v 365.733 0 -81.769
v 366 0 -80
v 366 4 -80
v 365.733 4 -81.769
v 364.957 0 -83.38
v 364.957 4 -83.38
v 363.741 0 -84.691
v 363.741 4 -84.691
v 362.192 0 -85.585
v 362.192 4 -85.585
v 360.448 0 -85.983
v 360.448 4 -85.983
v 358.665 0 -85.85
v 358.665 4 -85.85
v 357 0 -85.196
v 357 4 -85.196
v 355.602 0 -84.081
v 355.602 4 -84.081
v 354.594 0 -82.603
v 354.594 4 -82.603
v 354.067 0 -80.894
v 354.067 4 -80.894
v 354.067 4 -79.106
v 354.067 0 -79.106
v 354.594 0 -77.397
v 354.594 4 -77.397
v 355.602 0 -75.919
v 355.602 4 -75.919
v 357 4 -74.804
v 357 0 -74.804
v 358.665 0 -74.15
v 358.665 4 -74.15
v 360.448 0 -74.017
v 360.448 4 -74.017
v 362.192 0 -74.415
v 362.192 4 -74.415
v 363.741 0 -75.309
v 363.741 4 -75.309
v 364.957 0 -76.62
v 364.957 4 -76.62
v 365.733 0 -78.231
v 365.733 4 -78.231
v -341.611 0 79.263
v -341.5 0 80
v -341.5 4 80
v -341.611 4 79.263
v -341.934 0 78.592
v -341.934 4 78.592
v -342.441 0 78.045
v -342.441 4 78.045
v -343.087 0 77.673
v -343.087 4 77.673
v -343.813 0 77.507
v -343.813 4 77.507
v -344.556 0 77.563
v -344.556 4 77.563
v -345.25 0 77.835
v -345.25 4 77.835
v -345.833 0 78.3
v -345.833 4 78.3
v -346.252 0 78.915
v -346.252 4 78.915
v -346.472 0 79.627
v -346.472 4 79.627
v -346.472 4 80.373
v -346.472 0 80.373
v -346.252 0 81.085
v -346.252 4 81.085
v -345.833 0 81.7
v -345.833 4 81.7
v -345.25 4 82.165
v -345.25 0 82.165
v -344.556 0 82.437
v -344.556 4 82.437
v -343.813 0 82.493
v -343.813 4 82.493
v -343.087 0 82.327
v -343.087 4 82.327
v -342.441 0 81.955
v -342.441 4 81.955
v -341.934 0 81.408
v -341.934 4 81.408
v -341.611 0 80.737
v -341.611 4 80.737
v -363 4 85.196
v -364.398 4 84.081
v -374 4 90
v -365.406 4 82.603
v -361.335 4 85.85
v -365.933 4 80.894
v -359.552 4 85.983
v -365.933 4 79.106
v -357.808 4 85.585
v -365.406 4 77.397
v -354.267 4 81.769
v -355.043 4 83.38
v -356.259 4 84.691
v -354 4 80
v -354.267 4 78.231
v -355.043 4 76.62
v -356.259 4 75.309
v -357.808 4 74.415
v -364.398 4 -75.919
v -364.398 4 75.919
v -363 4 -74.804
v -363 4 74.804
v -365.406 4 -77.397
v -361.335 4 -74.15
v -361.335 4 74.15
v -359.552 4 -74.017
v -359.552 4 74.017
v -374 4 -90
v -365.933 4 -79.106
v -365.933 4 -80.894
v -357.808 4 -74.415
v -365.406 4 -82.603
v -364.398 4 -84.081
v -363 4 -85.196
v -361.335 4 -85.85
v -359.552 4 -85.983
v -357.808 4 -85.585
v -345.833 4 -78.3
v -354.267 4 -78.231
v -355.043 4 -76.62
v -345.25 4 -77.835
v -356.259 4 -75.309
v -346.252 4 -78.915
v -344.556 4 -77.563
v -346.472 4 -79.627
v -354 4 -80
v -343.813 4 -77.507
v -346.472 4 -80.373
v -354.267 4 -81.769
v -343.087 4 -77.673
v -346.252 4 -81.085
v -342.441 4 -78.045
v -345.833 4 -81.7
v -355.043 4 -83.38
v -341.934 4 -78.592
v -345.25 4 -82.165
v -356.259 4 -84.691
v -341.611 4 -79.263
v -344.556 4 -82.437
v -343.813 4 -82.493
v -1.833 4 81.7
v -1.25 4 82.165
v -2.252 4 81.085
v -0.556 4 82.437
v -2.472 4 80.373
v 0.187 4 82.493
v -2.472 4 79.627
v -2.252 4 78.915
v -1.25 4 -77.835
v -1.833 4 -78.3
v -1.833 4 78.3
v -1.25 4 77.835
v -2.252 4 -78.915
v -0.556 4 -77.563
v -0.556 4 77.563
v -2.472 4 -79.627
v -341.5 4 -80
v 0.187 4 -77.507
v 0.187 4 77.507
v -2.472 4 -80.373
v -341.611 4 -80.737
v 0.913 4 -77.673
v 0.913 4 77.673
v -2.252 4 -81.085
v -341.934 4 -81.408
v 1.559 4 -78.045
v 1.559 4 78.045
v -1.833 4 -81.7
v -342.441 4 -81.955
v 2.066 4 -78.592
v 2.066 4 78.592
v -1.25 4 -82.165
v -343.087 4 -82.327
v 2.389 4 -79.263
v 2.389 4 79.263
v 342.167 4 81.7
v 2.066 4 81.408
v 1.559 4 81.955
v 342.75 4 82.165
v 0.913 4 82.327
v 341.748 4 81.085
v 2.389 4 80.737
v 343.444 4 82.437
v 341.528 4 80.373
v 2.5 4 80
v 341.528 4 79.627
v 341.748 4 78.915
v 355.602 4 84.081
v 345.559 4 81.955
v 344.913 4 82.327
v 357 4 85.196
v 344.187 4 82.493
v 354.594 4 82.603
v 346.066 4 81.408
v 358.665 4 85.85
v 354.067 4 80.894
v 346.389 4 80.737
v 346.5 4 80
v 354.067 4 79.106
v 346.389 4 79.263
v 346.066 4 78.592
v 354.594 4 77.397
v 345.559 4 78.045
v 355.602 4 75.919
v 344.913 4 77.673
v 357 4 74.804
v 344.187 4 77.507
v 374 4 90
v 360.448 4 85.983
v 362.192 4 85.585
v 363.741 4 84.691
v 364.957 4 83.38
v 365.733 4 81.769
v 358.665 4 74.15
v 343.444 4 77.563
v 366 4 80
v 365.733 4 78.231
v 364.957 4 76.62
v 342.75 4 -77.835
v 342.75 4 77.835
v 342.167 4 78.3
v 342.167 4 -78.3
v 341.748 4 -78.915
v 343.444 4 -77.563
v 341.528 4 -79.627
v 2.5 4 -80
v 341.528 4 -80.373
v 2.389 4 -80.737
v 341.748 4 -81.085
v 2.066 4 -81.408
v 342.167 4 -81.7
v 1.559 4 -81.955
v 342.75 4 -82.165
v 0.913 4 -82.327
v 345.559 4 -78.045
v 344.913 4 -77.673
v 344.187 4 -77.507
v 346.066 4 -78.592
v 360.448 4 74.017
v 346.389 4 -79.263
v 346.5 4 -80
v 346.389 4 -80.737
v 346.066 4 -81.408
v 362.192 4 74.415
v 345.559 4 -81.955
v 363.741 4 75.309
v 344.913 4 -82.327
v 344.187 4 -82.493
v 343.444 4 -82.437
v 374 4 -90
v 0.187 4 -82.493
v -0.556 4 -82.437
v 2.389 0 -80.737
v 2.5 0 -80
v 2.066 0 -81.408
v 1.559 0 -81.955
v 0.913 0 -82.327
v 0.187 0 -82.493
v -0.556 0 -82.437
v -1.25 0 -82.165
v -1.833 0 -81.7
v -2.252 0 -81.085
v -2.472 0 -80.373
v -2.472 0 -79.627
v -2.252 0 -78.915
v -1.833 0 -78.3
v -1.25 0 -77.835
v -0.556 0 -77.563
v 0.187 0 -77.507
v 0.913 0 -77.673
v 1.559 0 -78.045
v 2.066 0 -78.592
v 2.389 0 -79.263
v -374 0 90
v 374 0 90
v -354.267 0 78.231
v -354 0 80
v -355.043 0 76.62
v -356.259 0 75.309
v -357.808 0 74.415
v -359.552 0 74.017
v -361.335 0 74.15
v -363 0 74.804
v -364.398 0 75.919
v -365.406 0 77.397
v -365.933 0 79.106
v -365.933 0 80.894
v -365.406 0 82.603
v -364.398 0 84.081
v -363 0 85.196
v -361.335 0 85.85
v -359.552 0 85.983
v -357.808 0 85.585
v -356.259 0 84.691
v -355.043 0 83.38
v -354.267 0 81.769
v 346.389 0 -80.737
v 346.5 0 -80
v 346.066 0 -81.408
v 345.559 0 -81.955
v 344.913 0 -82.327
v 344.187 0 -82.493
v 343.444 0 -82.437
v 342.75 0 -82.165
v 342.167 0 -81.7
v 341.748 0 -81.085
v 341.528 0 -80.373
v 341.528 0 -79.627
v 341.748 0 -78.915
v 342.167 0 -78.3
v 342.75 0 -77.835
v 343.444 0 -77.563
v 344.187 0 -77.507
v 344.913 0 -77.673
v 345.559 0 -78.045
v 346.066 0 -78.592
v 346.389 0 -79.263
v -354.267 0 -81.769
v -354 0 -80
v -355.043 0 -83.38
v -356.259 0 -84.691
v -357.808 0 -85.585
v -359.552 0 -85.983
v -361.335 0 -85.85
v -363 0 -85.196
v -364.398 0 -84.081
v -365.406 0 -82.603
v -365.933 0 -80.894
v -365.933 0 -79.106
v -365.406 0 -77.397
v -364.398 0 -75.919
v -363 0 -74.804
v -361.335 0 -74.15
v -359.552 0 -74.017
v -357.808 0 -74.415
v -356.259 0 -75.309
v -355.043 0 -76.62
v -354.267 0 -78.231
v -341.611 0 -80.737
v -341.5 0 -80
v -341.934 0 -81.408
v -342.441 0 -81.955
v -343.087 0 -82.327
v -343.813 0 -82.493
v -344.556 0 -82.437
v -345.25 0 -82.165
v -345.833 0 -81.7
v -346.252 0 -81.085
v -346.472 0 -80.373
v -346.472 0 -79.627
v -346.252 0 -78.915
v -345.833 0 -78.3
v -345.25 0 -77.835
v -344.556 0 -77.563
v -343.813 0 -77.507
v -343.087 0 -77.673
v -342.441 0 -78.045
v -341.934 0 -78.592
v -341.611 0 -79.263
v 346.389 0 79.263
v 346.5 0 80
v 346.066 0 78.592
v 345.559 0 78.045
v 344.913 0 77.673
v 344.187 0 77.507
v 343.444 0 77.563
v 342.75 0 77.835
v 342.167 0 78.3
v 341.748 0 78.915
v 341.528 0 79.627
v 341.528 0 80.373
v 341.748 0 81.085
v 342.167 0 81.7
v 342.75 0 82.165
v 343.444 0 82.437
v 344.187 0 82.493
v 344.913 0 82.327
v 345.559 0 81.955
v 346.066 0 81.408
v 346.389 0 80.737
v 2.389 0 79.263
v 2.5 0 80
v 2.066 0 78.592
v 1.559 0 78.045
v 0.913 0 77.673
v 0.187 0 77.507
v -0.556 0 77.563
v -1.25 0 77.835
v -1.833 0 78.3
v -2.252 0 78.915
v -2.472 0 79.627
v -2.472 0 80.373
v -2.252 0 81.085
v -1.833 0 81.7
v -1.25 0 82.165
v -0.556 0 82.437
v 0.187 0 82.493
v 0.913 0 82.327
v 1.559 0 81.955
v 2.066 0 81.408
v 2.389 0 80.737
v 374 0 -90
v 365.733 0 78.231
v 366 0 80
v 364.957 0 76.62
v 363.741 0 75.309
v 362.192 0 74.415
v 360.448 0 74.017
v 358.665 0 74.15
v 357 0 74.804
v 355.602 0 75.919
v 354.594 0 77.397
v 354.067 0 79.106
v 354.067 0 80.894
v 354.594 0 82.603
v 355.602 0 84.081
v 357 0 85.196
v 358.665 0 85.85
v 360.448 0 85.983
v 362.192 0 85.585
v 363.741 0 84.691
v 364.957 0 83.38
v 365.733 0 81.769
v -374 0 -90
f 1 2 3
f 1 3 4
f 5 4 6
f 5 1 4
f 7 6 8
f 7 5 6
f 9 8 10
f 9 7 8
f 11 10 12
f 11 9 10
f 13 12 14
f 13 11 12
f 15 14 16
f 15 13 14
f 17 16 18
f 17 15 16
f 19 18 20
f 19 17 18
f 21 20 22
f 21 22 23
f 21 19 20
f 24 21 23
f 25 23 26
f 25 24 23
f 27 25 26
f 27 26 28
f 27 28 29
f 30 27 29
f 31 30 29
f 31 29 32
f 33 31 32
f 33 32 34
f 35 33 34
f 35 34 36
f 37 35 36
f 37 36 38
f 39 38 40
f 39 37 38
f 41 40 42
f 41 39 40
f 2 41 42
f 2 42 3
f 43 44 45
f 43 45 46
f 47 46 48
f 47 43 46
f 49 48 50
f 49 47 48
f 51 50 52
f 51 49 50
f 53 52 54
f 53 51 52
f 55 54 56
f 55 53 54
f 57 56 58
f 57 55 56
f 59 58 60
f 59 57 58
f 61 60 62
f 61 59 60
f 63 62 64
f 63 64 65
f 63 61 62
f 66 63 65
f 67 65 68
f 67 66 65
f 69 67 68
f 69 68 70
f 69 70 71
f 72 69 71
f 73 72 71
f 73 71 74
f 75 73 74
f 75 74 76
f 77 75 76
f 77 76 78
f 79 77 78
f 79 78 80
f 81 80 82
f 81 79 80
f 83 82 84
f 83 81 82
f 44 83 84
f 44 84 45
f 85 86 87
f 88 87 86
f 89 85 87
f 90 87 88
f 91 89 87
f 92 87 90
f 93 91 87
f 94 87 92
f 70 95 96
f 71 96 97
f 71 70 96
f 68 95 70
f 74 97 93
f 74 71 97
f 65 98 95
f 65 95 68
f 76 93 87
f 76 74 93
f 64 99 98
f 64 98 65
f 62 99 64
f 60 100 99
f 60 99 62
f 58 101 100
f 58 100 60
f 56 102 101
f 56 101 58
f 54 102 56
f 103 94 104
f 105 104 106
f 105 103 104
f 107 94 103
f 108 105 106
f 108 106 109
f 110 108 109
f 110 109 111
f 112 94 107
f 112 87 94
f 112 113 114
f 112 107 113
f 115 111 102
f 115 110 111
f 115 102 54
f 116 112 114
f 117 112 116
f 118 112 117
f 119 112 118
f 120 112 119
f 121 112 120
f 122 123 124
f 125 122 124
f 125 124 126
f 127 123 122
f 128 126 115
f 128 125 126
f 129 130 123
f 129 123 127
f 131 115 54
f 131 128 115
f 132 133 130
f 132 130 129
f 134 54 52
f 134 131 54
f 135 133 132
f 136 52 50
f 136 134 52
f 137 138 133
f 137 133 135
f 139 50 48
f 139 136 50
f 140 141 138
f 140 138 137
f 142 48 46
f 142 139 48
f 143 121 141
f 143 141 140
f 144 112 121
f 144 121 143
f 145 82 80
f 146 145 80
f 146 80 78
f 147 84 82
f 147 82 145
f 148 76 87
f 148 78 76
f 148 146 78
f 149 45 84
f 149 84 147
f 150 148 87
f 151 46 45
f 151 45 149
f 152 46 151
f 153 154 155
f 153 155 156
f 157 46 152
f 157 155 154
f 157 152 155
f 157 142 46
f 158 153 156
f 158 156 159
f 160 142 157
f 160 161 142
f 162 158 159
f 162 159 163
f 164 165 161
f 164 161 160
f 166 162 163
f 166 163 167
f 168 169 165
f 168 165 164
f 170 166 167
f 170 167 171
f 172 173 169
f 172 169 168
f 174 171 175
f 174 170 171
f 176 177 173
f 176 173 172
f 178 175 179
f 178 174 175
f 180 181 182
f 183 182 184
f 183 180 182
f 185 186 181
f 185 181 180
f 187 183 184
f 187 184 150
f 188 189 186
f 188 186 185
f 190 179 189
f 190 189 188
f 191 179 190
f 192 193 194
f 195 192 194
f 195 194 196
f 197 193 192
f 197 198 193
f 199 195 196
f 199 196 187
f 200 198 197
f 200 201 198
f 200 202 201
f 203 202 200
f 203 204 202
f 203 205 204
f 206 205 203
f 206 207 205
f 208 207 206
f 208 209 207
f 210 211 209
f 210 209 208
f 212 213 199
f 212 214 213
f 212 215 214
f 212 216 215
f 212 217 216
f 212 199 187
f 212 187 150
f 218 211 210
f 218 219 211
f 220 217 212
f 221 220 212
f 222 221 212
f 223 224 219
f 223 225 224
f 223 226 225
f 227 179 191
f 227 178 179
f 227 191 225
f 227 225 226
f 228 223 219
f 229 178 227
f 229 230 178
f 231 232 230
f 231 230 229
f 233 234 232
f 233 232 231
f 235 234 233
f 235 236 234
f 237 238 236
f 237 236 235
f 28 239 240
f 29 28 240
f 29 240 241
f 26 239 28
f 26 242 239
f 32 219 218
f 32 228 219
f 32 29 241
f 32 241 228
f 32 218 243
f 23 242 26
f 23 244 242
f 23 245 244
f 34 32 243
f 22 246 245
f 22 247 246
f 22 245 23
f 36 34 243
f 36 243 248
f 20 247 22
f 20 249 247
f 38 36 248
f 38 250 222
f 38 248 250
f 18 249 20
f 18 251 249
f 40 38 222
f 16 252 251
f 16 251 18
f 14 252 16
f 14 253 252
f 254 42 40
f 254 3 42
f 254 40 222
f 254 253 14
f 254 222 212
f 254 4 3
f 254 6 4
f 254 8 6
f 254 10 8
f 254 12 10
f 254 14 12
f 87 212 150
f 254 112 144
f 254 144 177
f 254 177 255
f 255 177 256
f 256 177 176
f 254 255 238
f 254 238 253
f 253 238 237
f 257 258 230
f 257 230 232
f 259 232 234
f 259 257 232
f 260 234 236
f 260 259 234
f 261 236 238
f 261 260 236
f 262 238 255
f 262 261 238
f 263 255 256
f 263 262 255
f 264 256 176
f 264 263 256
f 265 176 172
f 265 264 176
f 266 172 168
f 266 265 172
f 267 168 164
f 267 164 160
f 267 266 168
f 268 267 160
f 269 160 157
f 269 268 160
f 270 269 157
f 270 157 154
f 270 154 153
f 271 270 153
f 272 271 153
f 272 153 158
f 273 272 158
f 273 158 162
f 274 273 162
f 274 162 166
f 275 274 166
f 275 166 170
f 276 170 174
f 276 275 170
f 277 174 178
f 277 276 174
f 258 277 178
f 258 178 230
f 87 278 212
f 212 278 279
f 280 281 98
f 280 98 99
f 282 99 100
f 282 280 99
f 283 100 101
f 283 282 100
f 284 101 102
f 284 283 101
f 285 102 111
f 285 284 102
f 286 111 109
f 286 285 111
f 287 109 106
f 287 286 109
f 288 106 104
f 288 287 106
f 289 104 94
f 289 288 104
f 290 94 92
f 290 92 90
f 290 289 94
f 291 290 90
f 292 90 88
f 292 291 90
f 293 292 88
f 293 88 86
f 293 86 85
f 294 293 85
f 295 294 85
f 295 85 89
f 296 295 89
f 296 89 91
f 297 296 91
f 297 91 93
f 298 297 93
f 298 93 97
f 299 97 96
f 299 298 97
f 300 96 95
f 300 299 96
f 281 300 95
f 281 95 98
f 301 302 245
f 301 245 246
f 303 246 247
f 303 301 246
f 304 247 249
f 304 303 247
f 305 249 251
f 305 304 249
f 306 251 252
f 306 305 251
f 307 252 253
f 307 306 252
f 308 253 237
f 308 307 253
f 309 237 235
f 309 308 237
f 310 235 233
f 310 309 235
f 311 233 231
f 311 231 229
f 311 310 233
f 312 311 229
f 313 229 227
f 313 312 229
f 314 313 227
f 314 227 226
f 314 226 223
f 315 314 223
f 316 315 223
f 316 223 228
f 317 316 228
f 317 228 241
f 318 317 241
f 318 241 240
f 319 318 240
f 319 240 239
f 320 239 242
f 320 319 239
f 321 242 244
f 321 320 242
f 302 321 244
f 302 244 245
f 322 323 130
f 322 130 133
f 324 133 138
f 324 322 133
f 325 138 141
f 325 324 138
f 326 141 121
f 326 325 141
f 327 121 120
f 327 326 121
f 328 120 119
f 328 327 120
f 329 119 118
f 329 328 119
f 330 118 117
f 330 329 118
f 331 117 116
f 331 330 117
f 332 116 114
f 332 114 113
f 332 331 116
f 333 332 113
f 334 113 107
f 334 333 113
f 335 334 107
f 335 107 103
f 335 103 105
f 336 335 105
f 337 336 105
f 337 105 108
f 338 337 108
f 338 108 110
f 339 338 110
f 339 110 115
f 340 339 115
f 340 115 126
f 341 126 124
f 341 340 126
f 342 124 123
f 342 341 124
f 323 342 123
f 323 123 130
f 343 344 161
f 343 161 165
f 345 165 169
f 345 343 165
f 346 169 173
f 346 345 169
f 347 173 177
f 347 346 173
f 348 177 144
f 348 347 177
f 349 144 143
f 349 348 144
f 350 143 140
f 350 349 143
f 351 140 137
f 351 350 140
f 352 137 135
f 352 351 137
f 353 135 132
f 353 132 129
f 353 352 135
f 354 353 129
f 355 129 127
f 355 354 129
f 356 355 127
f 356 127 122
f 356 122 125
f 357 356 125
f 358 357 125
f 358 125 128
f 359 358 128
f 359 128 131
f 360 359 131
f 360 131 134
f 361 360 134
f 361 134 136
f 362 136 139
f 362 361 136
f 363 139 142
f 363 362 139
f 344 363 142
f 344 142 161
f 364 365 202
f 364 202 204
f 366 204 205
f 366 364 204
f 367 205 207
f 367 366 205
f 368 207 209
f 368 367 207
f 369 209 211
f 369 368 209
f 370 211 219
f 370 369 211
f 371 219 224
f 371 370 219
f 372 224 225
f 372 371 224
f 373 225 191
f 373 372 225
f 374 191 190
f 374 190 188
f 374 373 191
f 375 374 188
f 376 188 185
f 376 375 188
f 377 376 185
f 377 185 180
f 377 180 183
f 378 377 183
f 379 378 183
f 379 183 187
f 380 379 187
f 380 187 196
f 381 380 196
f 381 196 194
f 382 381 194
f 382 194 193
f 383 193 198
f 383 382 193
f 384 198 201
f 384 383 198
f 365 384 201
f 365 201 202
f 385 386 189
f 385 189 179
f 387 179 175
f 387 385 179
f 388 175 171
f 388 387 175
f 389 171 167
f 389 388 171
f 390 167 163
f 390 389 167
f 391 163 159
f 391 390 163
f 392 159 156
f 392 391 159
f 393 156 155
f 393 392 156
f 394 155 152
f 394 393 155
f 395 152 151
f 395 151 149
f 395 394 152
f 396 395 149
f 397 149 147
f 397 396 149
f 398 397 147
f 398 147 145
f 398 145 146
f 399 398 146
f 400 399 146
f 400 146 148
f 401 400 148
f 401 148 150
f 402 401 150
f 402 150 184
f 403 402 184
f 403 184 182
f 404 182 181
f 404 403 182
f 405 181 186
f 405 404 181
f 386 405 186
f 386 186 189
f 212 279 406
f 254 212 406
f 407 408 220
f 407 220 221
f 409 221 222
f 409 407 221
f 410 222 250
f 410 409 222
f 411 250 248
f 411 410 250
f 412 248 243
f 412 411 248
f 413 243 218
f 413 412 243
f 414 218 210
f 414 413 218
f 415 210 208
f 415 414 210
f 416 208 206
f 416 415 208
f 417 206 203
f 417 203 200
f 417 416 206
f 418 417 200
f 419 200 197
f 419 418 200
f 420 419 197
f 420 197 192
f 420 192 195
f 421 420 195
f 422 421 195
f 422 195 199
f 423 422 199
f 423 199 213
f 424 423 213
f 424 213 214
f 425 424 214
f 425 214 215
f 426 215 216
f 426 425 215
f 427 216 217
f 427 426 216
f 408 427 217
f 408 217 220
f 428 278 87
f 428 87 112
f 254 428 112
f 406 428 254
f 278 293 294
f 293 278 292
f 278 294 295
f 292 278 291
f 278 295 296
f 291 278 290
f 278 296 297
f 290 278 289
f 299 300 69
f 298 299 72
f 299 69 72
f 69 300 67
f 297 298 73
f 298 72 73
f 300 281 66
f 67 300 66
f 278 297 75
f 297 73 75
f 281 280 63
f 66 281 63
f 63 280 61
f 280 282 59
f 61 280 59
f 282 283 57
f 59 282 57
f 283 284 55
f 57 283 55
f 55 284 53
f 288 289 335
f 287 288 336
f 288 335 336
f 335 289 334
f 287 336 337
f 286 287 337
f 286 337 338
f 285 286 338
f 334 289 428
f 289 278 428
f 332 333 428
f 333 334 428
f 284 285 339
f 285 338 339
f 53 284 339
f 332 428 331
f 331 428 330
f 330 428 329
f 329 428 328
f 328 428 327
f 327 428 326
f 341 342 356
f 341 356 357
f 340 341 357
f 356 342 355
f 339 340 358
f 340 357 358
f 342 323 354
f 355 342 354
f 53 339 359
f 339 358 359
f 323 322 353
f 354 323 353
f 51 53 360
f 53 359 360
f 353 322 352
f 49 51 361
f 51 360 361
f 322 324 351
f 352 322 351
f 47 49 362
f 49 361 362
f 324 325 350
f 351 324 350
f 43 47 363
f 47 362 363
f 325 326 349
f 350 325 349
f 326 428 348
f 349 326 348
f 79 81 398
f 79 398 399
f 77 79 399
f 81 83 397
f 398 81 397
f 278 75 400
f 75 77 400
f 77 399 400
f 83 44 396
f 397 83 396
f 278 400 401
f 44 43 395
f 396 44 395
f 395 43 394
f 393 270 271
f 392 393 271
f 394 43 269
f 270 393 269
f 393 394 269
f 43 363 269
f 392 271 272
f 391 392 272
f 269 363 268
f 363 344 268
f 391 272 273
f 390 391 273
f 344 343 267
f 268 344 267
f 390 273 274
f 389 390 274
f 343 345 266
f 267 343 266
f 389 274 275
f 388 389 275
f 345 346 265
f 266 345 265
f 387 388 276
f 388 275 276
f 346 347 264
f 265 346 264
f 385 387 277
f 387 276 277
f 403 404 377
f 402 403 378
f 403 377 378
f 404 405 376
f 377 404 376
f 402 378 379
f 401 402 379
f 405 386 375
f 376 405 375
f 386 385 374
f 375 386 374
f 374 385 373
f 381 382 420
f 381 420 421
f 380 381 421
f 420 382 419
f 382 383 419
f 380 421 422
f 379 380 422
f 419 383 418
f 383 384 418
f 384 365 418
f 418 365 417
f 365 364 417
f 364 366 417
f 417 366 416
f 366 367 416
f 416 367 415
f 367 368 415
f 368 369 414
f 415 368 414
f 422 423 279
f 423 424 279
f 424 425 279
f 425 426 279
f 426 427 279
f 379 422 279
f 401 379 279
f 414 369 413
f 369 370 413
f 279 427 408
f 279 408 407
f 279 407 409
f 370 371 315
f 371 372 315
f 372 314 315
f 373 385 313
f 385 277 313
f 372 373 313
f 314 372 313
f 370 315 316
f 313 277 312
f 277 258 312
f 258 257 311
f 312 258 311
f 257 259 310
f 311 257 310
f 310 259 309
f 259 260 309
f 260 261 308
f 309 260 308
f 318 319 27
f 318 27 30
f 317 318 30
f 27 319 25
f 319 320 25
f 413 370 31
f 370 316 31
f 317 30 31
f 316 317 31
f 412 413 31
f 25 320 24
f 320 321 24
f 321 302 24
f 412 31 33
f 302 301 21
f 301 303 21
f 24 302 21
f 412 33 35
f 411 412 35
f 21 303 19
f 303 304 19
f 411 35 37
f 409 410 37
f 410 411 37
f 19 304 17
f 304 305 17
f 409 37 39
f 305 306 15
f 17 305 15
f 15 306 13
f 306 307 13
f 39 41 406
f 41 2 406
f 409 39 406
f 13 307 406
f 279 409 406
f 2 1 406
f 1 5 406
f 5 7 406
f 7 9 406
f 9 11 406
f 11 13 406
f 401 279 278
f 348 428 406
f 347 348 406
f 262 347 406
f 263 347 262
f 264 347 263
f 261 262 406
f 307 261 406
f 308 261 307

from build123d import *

# Parameters (mm, degrees)
SKETCH1_W           = 748
SKETCH1_H           = 180
SKETCH1_R           = 2.5
SKETCH1_R_2         = 6
BOSS_EXTRUDE1_DEPTH = 4


with BuildPart() as part:
    # Sketch1 → Boss-Extrude1 (new body)
    with BuildSketch(Plane(origin=(0, 0, 0), x_dir=(1, 0, 0), z_dir=(0, 1, 0))):
        Rectangle(SKETCH1_W, SKETCH1_H)
        with Locations((-344, 80)):
            Circle(SKETCH1_R, mode=Mode.SUBTRACT)
        with Locations((0, 80)):
            Circle(SKETCH1_R, mode=Mode.SUBTRACT)
        with Locations((344, 80)):
            Circle(SKETCH1_R, mode=Mode.SUBTRACT)
        with Locations((-344, -80)):
            Circle(SKETCH1_R, mode=Mode.SUBTRACT)
        with Locations((0, -80)):
            Circle(SKETCH1_R, mode=Mode.SUBTRACT)
        with Locations((344, -80)):
            Circle(SKETCH1_R, mode=Mode.SUBTRACT)
        with Locations((-360, 80)):
            Circle(SKETCH1_R_2, mode=Mode.SUBTRACT)
        with Locations((-360, -80)):
            Circle(SKETCH1_R_2, mode=Mode.SUBTRACT)
        with Locations((360, -80)):
            Circle(SKETCH1_R_2, mode=Mode.SUBTRACT)
        with Locations((360, 80)):
            Circle(SKETCH1_R_2, mode=Mode.SUBTRACT)
    extrude(amount=BOSS_EXTRUDE1_DEPTH)


solid = part.part
